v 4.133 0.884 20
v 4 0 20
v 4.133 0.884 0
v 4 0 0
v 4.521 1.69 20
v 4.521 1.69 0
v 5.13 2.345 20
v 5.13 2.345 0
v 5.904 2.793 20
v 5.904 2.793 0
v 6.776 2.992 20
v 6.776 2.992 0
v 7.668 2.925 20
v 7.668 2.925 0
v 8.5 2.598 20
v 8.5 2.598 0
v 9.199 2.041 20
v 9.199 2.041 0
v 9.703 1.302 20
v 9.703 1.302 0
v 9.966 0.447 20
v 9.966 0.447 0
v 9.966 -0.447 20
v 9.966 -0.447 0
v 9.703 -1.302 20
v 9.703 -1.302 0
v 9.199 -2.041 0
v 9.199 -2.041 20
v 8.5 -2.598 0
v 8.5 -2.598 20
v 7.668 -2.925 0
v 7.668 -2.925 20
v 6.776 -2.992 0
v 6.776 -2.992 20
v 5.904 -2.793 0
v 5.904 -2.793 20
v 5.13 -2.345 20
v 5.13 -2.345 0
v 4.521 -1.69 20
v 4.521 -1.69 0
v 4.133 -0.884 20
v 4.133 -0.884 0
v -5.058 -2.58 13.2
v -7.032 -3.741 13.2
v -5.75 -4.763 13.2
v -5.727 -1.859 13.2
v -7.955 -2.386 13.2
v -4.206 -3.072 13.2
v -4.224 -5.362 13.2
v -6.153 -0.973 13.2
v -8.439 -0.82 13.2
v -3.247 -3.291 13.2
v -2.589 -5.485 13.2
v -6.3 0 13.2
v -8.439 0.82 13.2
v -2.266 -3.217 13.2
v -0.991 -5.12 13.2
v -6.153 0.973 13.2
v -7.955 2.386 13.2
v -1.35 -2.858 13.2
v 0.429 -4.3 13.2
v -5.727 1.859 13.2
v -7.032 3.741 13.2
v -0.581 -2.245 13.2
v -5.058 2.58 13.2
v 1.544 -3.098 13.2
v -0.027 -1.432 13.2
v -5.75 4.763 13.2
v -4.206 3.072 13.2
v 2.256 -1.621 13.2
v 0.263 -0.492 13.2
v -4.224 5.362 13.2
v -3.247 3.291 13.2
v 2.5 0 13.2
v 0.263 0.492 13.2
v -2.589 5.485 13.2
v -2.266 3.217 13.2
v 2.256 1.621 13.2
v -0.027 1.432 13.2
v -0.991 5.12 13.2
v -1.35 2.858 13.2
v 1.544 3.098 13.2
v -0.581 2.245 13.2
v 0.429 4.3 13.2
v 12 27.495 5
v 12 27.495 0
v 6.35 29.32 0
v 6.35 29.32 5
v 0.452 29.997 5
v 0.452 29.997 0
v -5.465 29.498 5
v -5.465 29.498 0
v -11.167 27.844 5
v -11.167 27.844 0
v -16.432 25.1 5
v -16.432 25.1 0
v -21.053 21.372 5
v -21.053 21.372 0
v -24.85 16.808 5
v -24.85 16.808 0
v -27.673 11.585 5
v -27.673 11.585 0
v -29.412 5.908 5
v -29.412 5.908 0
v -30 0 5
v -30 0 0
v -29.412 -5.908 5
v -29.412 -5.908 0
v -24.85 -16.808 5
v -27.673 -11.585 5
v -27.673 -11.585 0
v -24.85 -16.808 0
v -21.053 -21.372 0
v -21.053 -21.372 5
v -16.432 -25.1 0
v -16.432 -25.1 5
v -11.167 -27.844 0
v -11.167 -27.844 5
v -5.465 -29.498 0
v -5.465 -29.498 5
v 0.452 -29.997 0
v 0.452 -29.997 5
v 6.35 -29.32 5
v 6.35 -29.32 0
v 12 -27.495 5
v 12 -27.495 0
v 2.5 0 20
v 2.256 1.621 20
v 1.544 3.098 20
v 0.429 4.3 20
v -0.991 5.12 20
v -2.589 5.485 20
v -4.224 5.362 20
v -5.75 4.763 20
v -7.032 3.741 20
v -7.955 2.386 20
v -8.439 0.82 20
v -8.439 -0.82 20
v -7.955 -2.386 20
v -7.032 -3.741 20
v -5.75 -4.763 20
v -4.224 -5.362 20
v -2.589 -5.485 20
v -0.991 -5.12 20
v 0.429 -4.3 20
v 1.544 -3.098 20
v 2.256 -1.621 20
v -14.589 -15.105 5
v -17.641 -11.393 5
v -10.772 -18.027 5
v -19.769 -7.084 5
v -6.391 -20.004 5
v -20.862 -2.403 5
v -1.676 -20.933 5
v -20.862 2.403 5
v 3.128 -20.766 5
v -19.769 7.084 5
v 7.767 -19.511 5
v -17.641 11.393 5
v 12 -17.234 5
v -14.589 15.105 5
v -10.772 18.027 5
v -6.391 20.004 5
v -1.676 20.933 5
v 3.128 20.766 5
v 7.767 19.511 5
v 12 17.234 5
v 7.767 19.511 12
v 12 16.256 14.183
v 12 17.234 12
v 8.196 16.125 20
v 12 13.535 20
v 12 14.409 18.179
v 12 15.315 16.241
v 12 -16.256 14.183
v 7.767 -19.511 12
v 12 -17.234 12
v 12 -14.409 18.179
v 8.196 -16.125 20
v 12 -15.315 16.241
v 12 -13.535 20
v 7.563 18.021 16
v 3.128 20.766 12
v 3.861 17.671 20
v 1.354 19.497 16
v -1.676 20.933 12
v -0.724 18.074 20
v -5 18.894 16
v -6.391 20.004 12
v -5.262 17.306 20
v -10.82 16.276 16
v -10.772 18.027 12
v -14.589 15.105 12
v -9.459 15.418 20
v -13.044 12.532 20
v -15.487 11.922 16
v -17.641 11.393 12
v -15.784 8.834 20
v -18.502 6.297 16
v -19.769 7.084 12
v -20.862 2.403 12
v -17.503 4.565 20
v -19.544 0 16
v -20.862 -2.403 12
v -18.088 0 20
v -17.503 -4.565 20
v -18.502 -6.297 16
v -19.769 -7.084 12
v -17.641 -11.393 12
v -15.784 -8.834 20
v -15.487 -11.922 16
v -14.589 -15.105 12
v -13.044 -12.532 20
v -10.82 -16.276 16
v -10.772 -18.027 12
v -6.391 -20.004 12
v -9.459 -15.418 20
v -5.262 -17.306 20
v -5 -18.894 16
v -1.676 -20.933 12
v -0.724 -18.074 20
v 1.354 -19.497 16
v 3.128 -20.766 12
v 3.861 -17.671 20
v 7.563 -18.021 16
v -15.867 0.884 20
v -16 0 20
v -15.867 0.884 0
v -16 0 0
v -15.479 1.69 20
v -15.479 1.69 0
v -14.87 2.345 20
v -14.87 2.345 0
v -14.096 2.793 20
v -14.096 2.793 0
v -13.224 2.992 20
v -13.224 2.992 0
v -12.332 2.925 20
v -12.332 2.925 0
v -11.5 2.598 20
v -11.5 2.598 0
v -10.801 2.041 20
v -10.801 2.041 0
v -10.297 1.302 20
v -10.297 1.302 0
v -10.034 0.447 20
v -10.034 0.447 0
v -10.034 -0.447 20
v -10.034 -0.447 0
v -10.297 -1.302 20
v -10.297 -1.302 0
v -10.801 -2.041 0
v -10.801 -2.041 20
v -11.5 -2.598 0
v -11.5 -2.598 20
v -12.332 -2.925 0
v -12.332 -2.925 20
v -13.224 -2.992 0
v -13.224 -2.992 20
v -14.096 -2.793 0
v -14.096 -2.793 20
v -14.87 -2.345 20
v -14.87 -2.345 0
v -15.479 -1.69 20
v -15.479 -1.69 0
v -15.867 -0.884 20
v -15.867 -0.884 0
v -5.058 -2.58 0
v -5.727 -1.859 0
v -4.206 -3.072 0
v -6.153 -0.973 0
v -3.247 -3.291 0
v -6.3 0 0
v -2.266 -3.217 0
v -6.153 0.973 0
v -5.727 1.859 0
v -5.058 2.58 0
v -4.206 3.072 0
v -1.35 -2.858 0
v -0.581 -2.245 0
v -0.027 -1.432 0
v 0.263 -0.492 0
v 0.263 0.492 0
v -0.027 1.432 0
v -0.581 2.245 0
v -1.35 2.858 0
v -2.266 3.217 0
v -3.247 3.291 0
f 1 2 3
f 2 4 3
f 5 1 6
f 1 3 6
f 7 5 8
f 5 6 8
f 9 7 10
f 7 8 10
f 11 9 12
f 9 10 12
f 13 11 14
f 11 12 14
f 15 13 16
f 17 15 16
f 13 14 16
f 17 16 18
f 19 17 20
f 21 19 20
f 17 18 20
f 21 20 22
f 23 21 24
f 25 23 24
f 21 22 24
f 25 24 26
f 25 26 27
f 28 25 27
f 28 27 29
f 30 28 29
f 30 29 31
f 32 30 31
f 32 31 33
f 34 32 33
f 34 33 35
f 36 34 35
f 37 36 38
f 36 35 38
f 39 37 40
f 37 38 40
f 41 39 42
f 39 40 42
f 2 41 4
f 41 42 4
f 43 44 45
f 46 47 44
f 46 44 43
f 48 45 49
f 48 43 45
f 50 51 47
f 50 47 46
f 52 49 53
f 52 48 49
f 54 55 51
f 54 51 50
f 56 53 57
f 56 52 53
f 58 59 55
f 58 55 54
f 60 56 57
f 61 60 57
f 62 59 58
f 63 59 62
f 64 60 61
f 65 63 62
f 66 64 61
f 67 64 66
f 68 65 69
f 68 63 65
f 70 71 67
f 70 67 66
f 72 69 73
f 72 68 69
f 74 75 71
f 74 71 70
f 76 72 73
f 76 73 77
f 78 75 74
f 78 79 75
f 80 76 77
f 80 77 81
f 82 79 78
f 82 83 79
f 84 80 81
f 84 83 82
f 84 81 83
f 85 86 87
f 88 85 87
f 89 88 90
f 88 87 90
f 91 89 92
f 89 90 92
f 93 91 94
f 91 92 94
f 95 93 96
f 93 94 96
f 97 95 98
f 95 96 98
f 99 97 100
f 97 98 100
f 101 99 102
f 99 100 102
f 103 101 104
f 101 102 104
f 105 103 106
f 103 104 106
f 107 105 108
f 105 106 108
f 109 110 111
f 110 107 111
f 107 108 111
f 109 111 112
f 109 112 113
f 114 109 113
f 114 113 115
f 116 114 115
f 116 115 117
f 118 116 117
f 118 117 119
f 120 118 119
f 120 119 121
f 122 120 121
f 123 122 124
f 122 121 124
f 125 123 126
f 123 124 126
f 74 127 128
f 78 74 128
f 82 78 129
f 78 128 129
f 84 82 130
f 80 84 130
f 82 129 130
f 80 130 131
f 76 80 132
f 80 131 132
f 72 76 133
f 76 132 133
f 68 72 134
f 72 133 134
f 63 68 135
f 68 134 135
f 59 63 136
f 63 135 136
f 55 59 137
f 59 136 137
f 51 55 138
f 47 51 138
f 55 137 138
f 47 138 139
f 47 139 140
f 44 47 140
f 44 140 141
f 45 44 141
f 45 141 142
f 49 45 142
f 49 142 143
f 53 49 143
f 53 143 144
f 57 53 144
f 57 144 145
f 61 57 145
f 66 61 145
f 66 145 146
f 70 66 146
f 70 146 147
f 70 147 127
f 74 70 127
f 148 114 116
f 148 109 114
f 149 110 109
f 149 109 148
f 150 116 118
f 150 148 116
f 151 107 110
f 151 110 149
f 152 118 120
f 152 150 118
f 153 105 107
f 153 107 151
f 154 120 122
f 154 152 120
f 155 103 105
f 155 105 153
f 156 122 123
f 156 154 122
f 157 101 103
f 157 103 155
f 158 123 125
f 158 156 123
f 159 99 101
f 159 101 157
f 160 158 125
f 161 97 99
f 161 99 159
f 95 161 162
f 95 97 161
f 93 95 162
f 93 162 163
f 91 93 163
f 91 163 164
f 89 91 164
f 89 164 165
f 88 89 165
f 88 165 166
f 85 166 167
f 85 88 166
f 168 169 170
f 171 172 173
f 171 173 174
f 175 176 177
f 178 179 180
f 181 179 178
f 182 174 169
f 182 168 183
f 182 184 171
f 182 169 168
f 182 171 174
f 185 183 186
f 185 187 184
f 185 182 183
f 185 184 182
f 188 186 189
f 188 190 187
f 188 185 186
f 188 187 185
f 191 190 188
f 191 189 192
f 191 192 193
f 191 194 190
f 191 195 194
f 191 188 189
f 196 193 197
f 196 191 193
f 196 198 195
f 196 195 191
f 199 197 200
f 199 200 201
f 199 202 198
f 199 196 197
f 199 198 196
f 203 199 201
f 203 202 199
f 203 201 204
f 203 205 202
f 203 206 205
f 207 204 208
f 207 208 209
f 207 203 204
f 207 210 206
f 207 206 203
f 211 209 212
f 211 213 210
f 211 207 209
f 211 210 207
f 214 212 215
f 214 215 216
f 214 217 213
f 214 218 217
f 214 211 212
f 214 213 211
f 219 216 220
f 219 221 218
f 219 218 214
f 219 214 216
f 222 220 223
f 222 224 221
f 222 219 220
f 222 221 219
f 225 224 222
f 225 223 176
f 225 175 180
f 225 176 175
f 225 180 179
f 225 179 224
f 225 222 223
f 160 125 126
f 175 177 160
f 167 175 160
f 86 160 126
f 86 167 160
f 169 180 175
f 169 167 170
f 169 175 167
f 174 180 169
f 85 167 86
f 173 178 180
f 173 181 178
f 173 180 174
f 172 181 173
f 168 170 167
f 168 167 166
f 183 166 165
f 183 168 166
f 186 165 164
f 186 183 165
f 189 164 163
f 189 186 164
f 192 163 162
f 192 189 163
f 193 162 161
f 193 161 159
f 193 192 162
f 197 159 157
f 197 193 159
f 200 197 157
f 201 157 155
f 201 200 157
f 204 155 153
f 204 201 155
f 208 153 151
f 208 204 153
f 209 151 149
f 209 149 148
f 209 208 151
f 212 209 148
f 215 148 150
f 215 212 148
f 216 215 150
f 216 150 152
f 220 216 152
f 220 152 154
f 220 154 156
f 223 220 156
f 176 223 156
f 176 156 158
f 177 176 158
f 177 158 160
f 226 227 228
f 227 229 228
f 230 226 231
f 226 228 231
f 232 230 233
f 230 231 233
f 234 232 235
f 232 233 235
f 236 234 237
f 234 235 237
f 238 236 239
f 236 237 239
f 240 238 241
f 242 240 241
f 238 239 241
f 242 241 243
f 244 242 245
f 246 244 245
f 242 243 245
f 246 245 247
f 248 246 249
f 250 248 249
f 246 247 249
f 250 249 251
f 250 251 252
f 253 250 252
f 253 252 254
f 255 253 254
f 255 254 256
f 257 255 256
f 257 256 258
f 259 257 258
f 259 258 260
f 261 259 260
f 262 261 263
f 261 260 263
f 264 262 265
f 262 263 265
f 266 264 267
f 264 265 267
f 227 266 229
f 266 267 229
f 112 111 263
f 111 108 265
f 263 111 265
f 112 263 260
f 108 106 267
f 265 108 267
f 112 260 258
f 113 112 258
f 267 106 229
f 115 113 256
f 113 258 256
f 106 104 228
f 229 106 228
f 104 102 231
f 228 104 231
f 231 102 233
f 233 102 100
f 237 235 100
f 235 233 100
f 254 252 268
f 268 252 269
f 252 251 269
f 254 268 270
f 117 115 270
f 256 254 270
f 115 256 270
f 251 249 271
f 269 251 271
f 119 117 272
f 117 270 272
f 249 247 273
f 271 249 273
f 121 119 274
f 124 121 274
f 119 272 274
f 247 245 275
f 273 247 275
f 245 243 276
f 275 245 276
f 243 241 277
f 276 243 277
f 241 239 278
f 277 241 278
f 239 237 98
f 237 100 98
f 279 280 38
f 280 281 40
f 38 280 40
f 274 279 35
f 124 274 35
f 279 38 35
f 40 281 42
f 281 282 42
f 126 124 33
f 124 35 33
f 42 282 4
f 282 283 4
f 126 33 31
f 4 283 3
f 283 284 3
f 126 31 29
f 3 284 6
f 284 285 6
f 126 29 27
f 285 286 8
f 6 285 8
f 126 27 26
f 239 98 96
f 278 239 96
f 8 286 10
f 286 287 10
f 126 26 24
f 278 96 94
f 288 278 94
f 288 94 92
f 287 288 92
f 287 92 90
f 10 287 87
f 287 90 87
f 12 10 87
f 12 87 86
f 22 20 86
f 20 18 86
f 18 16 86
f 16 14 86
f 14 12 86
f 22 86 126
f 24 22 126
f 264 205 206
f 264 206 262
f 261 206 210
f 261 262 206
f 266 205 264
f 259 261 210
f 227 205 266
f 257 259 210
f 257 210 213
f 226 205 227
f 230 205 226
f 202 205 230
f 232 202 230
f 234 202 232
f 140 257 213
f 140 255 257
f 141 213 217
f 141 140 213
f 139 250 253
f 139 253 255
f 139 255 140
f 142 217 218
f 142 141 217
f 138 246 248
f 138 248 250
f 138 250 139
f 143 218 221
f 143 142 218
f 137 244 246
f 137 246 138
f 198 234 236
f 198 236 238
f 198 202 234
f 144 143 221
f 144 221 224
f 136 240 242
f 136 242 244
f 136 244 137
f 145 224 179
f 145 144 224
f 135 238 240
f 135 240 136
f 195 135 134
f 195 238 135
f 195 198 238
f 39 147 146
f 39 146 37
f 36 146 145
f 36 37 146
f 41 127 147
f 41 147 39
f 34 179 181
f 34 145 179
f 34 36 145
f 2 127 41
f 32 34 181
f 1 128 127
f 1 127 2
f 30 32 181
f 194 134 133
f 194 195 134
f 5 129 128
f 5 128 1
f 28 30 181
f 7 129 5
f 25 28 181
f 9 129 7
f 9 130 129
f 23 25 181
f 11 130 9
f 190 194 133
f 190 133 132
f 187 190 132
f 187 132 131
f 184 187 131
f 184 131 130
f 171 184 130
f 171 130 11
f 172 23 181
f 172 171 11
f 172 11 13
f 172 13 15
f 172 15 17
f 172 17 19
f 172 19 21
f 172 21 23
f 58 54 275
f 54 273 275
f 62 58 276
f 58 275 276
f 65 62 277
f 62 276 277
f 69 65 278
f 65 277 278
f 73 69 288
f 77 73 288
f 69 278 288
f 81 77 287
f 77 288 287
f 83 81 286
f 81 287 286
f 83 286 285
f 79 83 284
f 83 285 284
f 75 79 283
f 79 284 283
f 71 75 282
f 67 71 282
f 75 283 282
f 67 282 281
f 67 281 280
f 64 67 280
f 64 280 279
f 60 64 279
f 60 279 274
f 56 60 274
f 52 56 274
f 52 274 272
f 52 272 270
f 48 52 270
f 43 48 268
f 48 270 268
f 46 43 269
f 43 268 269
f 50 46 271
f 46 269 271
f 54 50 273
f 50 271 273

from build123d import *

# Parameters (mm, degrees)
SKETCH_1_R                = 30
EXTRUDE_1_DEPTH           = 20
MM_1_D                    = 6
MM_1_DEPTH                = 20
MM_1_TIP                  = 1.802581857
HOLE_WIZARD_1_D           = 6.6
HOLE_WIZARD_1_DEPTH       = 20
HOLE_WIZARD_1_CBORE_D     = 11
HOLE_WIZARD_1_CBORE_DEPTH = 6.8
HOLE_WIZARD_1_TIP         = 1.982840043
SKETCH_6_OUTSIDE_W        = 79.436
SKETCH_6_OUTSIDE_H        = 79.436
SKETCH_6_OUTSIDE_R        = 21
CUT_EXTRUDE_1_DEPTH       = 15
CHAMFER_1_SIZE            = 8
CHAMFER_1_SIZE2           = 2.911761874
SKETCH_7_W                = 35.972327204
SKETCH_7_H                = 68.406392716
CUT_EXTRUDE_2_DEPTH       = 47.904157598


with BuildPart() as part:
    # 草图1 → 凸台-拉伸1 (new body)
    with BuildSketch(Plane.XY):
        Circle(SKETCH_1_R)
    extrude(amount=EXTRUDE_1_DEPTH)

    # 大小mm 暗销孔1
    with Locations(Plane.XY.offset(20)):
        with Locations((-13, 0), (7, 0)):
            Hole(MM_1_D / 2, depth=MM_1_DEPTH)
            with Locations((0, 0, -(MM_1_DEPTH + MM_1_TIP / 2))):  # 118° drill point
                Cone(0, MM_1_D / 2, MM_1_TIP, mode=Mode.SUBTRACT)

    # 打孔尺寸(%根据)内六角圆柱头螺钉的类型1
    with Locations(Plane.XY.offset(20)):
        with Locations((-3, 0)):
            CounterBoreHole(HOLE_WIZARD_1_D / 2, HOLE_WIZARD_1_CBORE_D / 2, HOLE_WIZARD_1_CBORE_DEPTH, depth=HOLE_WIZARD_1_DEPTH)
            with Locations((0, 0, -(HOLE_WIZARD_1_DEPTH + HOLE_WIZARD_1_TIP / 2))):  # 118° drill point
                Cone(0, HOLE_WIZARD_1_D / 2, HOLE_WIZARD_1_TIP, mode=Mode.SUBTRACT)

    # 草图6 outside → 切除-拉伸1 (cut)
    with BuildSketch(Plane.XY.offset(20)):
        Rectangle(SKETCH_6_OUTSIDE_W, SKETCH_6_OUTSIDE_H)
        Circle(SKETCH_6_OUTSIDE_R, mode=Mode.SUBTRACT)
    extrude(amount=-CUT_EXTRUDE_1_DEPTH, mode=Mode.SUBTRACT)

    # 倒角1
    chamfer_1_edges = [part.edges().sort_by_distance(p)[0] for p in [
        (-21, 0, 20),
    ]]
    chamfer_1_side = [part.faces().sort_by_distance(p)[0] for p in [
        (-21, 0, 12.5),
    ]]
    chamfer(chamfer_1_edges, length=CHAMFER_1_SIZE, length2=CHAMFER_1_SIZE2, reference=chamfer_1_side[0])

    # 草图7 → 切除-拉伸2 (cut, through all)
    with BuildSketch(Plane.XY.offset(20)):
        with Locations((29.986163602, -1.092611915)):
            Rectangle(SKETCH_7_W, SKETCH_7_H)
    extrude(amount=-CUT_EXTRUDE_2_DEPTH, mode=Mode.SUBTRACT)


solid = part.part
